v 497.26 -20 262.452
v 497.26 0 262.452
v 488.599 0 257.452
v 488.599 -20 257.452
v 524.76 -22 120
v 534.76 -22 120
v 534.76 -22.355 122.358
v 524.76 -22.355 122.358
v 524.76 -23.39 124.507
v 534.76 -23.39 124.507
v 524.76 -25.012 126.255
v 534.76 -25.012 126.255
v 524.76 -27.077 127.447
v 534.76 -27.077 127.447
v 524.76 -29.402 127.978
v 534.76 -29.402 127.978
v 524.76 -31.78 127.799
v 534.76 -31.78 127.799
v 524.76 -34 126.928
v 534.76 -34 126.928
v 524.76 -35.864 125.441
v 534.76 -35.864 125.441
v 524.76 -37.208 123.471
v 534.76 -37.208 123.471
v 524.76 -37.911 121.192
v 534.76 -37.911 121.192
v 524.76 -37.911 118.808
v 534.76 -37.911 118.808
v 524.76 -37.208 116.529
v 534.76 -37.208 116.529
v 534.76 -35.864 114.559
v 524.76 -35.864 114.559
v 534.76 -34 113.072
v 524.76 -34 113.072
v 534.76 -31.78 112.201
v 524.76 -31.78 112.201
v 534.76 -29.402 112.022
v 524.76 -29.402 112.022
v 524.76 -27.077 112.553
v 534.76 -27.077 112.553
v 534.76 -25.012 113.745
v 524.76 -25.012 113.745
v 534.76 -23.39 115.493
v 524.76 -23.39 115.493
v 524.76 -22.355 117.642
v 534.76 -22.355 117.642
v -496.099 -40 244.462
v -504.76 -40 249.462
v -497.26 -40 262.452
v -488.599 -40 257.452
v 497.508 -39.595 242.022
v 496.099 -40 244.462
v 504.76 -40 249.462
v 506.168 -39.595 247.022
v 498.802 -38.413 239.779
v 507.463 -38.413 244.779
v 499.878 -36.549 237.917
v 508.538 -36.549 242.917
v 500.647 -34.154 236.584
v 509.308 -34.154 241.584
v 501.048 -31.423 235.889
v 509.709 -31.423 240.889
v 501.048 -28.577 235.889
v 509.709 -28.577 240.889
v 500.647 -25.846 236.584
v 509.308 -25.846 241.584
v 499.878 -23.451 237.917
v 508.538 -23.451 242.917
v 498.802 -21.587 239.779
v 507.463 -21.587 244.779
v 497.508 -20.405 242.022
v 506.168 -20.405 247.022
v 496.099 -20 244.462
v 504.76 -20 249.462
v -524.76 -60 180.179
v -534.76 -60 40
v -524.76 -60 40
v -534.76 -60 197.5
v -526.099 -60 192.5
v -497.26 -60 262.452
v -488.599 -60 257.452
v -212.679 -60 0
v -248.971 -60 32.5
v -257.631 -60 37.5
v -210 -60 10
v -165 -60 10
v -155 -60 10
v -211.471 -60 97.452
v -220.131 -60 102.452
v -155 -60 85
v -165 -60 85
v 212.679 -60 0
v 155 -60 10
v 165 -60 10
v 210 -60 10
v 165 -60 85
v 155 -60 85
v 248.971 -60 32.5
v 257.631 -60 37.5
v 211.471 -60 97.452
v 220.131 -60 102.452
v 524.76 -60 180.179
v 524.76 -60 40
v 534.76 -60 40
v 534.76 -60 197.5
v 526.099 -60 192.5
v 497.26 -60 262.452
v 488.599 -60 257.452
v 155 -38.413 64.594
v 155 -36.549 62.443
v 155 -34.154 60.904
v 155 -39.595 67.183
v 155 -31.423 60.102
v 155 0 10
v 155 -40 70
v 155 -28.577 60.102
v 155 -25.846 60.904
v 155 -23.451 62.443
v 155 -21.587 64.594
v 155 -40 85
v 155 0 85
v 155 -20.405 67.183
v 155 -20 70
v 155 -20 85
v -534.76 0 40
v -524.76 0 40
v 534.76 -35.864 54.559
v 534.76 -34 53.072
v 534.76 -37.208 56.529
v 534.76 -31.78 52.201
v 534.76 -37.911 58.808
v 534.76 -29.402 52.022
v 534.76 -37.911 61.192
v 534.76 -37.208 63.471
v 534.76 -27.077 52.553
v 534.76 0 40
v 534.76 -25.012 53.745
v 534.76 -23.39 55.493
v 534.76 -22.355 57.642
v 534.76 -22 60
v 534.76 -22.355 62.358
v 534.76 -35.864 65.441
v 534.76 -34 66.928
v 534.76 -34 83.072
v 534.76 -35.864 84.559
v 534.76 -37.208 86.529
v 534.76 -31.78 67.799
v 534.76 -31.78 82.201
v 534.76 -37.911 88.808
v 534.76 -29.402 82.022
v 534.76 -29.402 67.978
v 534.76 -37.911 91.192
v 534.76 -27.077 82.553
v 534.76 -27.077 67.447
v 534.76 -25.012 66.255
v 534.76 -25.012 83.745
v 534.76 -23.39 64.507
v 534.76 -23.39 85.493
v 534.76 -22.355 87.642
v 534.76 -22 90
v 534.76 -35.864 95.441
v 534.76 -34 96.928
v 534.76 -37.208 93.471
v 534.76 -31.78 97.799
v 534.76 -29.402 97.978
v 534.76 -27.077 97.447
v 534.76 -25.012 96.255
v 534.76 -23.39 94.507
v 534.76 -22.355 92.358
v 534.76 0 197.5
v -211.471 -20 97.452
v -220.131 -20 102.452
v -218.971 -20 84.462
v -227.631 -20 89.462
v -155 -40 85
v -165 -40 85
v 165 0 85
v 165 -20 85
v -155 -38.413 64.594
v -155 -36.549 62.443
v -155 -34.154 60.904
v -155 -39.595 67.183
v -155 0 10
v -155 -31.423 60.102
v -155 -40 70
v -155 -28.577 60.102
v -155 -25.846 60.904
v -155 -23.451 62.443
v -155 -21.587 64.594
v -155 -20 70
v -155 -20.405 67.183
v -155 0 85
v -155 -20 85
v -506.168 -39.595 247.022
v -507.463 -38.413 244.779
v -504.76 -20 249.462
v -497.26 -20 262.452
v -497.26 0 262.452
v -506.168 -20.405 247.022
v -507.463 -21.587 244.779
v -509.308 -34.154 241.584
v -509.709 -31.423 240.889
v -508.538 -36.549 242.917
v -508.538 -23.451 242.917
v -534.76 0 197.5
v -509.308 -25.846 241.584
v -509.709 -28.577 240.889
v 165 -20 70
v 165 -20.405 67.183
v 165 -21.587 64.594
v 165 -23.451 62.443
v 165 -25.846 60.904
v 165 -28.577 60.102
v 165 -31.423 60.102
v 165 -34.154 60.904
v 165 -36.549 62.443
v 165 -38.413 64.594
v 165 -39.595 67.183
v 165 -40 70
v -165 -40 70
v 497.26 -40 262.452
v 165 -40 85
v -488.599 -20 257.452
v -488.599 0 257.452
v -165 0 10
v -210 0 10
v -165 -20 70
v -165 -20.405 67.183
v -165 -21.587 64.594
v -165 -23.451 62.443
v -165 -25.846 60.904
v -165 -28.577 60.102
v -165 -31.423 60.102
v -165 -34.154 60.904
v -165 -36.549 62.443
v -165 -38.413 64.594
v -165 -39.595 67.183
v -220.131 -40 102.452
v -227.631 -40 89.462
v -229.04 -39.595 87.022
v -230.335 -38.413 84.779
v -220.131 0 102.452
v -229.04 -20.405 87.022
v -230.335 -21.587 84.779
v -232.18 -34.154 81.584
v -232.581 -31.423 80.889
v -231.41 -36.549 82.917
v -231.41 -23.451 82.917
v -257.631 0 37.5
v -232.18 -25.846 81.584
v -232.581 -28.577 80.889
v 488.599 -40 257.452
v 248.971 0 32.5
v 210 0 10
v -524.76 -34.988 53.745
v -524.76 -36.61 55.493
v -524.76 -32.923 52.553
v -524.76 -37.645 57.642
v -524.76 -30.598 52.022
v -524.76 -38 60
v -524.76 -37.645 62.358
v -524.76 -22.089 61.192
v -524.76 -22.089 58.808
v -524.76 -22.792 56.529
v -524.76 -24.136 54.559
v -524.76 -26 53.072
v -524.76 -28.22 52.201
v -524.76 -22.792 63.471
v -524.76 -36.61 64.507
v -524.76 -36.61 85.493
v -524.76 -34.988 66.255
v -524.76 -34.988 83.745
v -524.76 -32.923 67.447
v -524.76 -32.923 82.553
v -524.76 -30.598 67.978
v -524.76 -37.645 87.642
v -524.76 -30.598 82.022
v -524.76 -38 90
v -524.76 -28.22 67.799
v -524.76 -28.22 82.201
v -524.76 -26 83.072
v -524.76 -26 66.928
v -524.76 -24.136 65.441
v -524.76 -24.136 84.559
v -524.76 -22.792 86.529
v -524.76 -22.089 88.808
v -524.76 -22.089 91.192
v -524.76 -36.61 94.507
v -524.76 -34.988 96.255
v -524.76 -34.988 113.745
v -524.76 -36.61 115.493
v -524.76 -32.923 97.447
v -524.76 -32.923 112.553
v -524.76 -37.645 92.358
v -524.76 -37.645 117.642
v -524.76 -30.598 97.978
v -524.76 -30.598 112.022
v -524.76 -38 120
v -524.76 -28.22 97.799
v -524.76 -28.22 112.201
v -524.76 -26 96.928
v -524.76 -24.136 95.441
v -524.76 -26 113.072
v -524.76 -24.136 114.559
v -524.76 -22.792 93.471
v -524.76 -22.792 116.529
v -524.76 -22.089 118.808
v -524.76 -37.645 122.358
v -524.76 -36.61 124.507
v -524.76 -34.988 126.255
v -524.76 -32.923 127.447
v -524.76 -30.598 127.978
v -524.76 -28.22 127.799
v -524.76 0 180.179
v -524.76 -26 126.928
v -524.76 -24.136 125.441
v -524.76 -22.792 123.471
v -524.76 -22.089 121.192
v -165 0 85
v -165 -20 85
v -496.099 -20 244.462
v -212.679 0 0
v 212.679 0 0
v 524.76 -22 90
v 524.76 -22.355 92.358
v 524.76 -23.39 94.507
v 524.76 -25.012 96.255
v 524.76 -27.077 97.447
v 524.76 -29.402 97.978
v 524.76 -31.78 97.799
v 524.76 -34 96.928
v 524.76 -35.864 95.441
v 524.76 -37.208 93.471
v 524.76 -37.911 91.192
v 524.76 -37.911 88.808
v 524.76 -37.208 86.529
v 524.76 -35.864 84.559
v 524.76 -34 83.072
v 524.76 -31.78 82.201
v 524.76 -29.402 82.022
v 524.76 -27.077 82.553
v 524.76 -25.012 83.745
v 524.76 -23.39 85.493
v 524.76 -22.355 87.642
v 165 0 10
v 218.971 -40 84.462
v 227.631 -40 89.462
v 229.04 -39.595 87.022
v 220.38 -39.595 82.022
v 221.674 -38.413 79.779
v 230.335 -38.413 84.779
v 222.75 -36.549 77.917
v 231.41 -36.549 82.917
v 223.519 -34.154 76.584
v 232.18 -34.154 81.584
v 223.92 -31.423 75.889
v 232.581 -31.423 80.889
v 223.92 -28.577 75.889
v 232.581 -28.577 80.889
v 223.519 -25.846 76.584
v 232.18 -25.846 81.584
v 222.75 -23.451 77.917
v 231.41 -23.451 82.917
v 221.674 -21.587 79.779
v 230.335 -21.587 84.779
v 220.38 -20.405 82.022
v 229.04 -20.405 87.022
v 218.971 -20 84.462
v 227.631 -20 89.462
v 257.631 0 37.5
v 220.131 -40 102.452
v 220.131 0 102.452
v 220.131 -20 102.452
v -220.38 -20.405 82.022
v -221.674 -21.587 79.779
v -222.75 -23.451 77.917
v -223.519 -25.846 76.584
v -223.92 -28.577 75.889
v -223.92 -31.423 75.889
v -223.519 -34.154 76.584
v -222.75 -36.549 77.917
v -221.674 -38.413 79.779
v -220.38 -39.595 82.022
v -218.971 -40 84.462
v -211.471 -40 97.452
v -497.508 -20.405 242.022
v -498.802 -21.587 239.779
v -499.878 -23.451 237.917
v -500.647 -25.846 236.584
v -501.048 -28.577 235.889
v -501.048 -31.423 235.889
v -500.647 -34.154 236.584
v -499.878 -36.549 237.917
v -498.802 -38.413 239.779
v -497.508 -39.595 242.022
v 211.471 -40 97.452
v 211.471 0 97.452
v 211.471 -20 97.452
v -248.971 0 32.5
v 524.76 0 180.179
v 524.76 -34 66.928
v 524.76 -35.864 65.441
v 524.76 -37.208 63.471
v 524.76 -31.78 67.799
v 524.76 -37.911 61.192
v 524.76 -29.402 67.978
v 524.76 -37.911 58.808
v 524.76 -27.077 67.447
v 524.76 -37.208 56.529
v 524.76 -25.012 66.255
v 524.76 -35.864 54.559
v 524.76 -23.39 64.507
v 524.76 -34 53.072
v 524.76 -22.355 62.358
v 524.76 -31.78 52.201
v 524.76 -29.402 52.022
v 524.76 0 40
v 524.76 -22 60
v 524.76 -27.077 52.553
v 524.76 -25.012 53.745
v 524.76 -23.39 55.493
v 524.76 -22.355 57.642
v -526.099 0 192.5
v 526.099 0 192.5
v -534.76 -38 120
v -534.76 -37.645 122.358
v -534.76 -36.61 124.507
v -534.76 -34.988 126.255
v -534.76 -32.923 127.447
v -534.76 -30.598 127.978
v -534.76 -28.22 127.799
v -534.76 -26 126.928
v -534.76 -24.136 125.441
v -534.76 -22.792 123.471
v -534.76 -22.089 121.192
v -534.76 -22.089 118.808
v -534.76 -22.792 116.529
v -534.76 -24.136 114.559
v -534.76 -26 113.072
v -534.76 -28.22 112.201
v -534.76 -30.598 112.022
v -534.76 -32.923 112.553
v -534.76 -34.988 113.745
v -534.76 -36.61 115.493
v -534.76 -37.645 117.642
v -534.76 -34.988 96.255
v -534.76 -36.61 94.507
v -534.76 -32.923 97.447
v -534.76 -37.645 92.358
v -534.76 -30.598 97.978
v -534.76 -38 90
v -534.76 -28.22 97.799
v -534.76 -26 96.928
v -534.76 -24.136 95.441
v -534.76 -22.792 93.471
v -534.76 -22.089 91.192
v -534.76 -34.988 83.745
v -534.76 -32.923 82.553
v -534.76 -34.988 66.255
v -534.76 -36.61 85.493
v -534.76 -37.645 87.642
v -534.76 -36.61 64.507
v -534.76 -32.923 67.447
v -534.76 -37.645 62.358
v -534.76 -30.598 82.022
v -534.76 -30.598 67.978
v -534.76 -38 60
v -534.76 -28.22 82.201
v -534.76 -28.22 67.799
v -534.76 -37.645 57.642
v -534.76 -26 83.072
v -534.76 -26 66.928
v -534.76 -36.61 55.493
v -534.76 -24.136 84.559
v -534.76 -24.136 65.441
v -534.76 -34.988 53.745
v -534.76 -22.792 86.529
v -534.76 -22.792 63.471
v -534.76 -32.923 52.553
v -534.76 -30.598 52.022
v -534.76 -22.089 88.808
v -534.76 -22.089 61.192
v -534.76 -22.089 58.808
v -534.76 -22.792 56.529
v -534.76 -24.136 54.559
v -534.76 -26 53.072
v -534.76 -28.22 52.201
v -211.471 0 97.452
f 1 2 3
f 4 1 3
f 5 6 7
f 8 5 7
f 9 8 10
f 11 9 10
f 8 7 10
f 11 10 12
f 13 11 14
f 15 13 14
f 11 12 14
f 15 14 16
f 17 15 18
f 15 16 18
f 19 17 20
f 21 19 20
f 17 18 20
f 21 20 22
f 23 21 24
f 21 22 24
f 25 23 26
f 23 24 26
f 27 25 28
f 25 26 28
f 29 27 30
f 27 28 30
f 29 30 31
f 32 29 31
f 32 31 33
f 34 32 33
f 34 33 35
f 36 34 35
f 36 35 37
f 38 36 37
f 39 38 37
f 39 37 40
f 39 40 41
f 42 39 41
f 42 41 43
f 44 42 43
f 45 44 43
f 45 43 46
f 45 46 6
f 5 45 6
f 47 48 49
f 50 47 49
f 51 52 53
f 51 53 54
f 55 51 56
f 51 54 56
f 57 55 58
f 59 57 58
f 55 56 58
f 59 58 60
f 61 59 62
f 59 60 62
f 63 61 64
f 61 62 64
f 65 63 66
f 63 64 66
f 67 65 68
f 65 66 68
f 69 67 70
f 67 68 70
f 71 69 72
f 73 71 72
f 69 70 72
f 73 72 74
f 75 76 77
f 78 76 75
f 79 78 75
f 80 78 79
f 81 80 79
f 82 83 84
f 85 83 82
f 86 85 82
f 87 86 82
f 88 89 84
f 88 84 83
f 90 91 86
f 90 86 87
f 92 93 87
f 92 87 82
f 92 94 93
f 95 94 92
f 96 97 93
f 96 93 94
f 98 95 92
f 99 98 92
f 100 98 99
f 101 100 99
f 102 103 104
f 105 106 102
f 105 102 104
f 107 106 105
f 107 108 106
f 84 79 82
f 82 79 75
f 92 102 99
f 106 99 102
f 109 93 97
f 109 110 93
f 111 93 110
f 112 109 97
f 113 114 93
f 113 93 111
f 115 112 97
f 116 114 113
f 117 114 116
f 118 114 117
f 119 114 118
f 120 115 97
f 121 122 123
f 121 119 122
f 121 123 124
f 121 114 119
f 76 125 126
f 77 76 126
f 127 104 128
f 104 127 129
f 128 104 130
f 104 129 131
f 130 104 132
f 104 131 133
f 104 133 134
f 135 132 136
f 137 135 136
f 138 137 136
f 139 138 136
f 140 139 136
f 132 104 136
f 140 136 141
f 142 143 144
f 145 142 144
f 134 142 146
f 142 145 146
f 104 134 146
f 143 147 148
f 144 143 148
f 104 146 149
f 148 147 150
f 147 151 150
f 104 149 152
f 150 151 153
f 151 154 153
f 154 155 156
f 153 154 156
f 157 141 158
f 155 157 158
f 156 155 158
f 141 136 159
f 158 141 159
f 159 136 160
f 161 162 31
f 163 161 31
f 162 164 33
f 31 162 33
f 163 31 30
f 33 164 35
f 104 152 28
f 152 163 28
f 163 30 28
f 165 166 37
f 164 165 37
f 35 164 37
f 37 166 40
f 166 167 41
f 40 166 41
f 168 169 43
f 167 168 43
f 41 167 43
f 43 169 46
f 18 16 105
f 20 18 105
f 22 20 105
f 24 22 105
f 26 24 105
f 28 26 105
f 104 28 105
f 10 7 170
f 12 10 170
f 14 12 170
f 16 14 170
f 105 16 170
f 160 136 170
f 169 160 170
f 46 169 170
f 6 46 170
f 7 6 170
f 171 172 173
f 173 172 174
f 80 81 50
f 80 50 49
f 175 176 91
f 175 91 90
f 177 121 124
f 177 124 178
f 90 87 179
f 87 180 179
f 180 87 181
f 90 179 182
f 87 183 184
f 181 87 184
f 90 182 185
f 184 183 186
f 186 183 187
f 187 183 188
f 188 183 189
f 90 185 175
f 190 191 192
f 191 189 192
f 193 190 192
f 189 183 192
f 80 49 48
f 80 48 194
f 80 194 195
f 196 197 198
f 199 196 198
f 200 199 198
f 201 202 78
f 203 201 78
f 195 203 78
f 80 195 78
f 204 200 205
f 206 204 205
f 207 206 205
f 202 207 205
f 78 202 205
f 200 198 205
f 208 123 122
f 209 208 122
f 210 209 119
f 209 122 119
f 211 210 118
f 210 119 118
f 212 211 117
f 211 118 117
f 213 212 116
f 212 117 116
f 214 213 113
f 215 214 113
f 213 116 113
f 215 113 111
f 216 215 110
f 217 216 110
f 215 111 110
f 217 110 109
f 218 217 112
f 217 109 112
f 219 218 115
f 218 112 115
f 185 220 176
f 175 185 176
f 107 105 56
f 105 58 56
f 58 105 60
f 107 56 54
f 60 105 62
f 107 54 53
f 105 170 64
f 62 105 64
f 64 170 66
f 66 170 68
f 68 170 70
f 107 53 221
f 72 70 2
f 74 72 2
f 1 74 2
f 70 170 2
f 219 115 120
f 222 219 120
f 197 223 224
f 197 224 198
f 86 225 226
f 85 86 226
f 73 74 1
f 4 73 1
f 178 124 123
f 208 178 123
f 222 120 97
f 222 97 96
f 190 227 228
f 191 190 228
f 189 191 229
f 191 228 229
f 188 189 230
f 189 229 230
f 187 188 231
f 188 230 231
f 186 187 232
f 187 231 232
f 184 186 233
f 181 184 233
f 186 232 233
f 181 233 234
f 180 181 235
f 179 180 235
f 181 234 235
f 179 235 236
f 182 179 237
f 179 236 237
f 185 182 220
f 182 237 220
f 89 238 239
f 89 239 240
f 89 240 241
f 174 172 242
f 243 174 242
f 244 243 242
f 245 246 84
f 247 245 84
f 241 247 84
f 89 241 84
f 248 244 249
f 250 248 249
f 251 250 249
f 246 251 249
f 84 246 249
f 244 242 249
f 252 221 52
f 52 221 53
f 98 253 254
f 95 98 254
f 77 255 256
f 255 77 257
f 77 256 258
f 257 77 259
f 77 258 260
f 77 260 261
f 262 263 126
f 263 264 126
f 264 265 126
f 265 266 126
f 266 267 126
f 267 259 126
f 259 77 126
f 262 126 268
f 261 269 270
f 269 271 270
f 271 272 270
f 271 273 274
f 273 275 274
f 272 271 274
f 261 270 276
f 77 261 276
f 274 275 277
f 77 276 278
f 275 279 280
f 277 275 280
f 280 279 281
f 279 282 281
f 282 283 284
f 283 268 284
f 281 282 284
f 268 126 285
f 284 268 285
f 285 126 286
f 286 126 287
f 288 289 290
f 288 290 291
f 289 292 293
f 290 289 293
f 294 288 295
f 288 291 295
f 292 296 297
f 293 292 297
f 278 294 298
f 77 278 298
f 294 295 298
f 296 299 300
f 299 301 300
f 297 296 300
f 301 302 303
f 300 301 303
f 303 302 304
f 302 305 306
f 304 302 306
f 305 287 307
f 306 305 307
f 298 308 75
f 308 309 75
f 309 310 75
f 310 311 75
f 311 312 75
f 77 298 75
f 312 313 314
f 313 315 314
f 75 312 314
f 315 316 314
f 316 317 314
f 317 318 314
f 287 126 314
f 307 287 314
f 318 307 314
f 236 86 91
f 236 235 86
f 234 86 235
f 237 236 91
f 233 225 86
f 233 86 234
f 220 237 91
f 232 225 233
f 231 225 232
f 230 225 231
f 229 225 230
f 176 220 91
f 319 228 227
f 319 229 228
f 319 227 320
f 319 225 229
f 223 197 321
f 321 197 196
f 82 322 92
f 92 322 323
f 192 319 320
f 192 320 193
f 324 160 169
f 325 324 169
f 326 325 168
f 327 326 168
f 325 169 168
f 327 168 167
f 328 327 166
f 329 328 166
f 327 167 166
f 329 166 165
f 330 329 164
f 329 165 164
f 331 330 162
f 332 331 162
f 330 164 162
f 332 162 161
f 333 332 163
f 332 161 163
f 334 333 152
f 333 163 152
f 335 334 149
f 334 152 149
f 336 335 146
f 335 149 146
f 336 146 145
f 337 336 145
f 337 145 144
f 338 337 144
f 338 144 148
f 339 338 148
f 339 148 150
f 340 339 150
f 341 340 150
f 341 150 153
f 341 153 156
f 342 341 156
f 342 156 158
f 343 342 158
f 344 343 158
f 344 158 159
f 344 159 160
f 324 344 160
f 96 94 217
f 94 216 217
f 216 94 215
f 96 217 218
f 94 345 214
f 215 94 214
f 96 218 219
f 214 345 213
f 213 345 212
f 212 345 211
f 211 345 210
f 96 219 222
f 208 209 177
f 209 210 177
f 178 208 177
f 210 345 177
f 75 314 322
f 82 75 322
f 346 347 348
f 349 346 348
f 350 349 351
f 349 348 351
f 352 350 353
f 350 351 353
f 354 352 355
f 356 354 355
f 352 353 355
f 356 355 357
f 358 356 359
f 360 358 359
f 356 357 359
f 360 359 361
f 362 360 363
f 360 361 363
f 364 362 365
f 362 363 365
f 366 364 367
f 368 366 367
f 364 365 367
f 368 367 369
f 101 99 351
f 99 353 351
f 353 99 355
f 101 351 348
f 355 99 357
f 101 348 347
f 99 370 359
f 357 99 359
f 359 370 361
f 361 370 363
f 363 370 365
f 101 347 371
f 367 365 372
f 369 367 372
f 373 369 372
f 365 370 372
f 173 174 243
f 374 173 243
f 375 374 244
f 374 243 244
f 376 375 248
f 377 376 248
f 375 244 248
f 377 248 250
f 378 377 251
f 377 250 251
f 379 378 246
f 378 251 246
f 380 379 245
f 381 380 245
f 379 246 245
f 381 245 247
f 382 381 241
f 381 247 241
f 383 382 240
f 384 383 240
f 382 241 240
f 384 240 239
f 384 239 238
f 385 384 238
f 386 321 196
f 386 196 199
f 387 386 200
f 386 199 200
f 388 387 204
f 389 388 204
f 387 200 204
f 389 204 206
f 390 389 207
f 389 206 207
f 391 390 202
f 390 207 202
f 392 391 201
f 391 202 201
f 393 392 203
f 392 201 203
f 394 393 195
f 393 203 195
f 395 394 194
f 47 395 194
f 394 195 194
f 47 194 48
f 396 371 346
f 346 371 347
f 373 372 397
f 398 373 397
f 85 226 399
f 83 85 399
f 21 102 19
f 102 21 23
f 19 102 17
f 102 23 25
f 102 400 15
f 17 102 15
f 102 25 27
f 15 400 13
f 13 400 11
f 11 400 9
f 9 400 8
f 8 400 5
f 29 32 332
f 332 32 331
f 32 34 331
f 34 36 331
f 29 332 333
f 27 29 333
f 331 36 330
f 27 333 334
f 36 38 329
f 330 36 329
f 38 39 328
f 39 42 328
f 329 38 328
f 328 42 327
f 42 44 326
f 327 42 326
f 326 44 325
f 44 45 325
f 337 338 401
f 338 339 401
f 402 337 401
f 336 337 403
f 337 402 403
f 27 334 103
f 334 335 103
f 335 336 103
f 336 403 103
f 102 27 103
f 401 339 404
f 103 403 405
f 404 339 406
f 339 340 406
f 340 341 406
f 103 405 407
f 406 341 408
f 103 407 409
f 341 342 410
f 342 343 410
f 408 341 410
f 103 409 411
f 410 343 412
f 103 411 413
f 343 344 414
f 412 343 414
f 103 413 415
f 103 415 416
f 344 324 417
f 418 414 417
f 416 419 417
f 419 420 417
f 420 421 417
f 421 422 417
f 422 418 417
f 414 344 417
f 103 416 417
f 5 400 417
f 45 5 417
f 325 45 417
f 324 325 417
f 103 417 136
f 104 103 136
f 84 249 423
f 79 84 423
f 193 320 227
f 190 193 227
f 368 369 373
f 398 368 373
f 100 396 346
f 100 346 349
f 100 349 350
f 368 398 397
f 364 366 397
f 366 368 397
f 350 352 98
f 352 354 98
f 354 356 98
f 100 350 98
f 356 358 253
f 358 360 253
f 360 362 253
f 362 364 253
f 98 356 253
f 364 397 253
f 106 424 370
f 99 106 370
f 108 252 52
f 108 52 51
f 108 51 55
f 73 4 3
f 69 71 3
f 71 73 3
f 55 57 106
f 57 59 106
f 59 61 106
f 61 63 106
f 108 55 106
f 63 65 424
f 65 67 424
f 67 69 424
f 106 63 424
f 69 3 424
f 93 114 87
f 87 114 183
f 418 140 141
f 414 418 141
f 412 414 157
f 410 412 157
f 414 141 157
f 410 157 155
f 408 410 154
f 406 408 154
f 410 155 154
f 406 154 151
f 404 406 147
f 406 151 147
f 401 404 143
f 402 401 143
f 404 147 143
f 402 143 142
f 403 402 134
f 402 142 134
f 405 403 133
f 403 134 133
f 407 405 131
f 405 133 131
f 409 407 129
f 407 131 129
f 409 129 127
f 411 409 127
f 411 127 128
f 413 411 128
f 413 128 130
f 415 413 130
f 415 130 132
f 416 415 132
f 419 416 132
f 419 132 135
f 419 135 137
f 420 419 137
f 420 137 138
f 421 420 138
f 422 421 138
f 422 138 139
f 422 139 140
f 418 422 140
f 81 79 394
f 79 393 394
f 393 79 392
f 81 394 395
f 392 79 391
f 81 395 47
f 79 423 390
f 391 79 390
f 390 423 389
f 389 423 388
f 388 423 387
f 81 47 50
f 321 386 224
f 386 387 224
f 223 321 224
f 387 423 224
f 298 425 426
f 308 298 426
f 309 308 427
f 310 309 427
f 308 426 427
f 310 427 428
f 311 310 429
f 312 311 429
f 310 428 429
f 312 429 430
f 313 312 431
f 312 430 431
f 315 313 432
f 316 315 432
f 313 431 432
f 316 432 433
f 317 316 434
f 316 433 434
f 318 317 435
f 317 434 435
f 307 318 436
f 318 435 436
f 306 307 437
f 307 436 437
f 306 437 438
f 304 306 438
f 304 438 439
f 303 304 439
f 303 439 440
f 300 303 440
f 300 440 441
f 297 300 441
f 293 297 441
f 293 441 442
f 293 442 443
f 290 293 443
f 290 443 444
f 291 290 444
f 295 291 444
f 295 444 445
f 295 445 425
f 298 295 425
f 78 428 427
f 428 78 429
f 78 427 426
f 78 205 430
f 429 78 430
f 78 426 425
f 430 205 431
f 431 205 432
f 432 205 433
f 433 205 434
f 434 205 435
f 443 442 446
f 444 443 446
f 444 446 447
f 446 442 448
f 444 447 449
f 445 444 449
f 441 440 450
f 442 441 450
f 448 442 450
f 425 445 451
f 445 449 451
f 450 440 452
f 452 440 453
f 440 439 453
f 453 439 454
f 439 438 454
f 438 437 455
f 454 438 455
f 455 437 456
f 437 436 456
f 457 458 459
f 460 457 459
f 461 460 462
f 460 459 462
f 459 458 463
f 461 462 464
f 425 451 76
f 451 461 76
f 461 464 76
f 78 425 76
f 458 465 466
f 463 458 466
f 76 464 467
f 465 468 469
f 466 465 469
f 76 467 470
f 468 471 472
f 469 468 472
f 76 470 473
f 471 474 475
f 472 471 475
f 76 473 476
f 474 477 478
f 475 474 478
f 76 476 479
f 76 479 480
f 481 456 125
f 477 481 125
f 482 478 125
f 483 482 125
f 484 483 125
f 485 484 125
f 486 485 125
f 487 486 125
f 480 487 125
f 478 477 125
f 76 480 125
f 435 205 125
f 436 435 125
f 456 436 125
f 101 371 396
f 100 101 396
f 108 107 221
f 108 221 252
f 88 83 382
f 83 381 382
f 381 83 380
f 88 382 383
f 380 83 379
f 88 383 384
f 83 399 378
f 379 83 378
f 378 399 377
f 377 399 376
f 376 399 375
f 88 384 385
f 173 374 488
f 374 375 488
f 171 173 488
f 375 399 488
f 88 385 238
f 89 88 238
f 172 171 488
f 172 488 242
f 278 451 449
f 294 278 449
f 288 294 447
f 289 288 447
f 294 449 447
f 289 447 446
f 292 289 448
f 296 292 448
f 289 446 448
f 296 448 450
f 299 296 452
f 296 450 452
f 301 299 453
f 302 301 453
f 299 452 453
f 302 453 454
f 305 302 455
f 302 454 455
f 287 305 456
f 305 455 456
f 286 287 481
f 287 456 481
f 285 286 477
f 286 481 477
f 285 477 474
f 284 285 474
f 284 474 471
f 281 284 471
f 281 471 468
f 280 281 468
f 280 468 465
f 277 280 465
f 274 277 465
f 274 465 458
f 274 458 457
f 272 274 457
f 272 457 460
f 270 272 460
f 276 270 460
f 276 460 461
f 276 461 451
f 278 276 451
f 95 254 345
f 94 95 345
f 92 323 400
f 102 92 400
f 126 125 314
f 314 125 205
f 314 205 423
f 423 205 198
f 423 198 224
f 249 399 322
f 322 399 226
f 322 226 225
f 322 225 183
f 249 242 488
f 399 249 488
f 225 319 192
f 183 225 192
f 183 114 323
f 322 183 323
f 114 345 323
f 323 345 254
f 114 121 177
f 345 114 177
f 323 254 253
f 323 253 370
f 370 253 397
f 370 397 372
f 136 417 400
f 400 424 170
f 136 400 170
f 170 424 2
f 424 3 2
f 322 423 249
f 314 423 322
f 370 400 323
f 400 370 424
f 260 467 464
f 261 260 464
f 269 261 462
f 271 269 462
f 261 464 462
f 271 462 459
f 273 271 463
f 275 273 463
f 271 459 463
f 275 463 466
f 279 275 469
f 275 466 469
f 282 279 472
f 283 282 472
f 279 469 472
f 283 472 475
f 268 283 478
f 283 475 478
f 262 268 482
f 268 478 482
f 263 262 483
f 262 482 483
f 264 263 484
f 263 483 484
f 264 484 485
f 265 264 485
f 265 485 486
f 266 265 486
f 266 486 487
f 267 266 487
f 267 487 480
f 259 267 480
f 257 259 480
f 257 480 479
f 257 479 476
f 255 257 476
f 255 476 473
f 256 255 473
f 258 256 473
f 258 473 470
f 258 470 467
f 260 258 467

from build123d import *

# Parameters (mm, degrees)
F0_W      = 10
F0_H      = 75
F1_DEPTH  = 60
F3_DEPTH  = 330
F5_DEPTH  = 330
F7_DEPTH  = 330
F8_R      = 8
F9_DEPTH  = 25
F10_R     = 8
F11_DEPTH = 25


with BuildPart() as f1:
    # F0 (on Front) → F1 (new body)
    with BuildSketch(Plane.XZ):
        Polygon((248.9711431703, 32.5), (210, 10), (165, 10), (155, 10), (0, 10), (0, 0), (212.6794919243, 0), (524.7595264192, 180.1794919243), (524.7595264192, 40), (534.7595264192, 40), (534.7595264192, 197.5), (526.0992723813, 192.5), (257.6313972081, 37.5), align=None)
        Polygon((211.4711431703, 97.4519052838), (248.9711431703, 32.5), (257.6313972081, 37.5), (220.1313972081, 102.4519052838), align=None)
        with Locations((160, 47.5)):
            Rectangle(F0_W, F0_H)
        Polygon((488.5992723813, 257.4519052838), (526.0992723813, 192.5), (534.7595264192, 197.5), (497.2595264192, 262.4519052838), align=None)
        Polygon((0, 0), (0, 10), (-155, 10), (-165, 10), (-210, 10), (-248.9711431703, 32.5), (-257.6313972081, 37.5), (-526.0992723813, 192.5), (-534.7595264192, 197.5), (-534.7595264192, 40), (-524.7595264192, 40), (-524.7595264192, 180.1794919243), (-212.6794919243, 0), align=None)
        with Locations((-160, 47.5)):
            Rectangle(F0_W, F0_H)
        Polygon((-257.6313972081, 37.5), (-248.9711431703, 32.5), (-211.4711431703, 97.4519052838), (-220.1313972081, 102.4519052838), align=None)
        Polygon((-497.2595264192, 262.4519052838), (-534.7595264192, 197.5), (-526.0992723813, 192.5), (-488.5992723813, 257.4519052838), align=None)
    extrude(amount=F1_DEPTH)

    # F2 (on face) → F3 (cut, through all)
    with BuildSketch(Plane(origin=(-486.5896534381, 0, 280.9326673974), x_dir=(0, -1, 0), z_dir=(-0.8660254038, 0, 0.5))):
        with BuildLine():
            Line((40, -21.3397459622), (20, -21.3397459622))
            Line((20, -21.3397459622), (20, -36.3397459622))
            ThreePointArc((20, -36.3397459622), (30, -46.3397459622), (40, -36.3397459622))
            Line((40, -36.3397459622), (40, -21.3397459622))
        make_face()
    extrude(amount=-F3_DEPTH, mode=Mode.SUBTRACT)

    # F4 (on face) → F5 (cut, through all)
    with BuildSketch(Plane(origin=(-165, 0, 0), x_dir=(0, -1, 0), z_dir=(-1, 0, 0))):
        with BuildLine():
            Line((40, 70), (40, 85))
            Line((40, 85), (20, 85))
            Line((20, 85), (20, 70))
            ThreePointArc((20, 70), (30, 60), (40, 70))
        make_face()
    extrude(amount=-F5_DEPTH, mode=Mode.SUBTRACT)

    # F6 (on face) → F7 (cut, through all)
    with BuildSketch(Plane(origin=(486.5896534381, 0, 280.9326673974), x_dir=(0, 1, 0), z_dir=(0.8660254038, 0, 0.5))):
        with BuildLine():
            Line((-40, -21.3397459622), (-40, -36.3397459622))
            ThreePointArc((-40, -36.3397459622), (-30, -46.3397459622), (-20, -36.3397459622))
            Line((-20, -36.3397459622), (-20, -21.3397459622))
            Line((-20, -21.3397459622), (-40, -21.3397459622))
        make_face()
    extrude(amount=-F7_DEPTH, mode=Mode.SUBTRACT)

    # F8 (on face) → F9 (cut)
    with BuildSketch(Plane(origin=(-534.7595264192, 0, 0), x_dir=(0, -1, 0), z_dir=(-1, 0, 0))):
        with Locations((30, 60)):
            Circle(F8_R)
        with Locations((30, 120)):
            Circle(F8_R)
        with Locations((30, 90)):
            Circle(F8_R)
    extrude(amount=-F9_DEPTH, mode=Mode.SUBTRACT)

    # F10 (on face) → F11 (cut)
    with BuildSketch(Plane.YZ.offset(534.7595264192)):
        with Locations((-30, 60)):
            Circle(F10_R)
        with Locations((-30, 120)):
            Circle(F10_R)
        with Locations((-30, 90)):
            Circle(F10_R)
    extrude(amount=-F11_DEPTH, mode=Mode.SUBTRACT)


solid = f1.part
